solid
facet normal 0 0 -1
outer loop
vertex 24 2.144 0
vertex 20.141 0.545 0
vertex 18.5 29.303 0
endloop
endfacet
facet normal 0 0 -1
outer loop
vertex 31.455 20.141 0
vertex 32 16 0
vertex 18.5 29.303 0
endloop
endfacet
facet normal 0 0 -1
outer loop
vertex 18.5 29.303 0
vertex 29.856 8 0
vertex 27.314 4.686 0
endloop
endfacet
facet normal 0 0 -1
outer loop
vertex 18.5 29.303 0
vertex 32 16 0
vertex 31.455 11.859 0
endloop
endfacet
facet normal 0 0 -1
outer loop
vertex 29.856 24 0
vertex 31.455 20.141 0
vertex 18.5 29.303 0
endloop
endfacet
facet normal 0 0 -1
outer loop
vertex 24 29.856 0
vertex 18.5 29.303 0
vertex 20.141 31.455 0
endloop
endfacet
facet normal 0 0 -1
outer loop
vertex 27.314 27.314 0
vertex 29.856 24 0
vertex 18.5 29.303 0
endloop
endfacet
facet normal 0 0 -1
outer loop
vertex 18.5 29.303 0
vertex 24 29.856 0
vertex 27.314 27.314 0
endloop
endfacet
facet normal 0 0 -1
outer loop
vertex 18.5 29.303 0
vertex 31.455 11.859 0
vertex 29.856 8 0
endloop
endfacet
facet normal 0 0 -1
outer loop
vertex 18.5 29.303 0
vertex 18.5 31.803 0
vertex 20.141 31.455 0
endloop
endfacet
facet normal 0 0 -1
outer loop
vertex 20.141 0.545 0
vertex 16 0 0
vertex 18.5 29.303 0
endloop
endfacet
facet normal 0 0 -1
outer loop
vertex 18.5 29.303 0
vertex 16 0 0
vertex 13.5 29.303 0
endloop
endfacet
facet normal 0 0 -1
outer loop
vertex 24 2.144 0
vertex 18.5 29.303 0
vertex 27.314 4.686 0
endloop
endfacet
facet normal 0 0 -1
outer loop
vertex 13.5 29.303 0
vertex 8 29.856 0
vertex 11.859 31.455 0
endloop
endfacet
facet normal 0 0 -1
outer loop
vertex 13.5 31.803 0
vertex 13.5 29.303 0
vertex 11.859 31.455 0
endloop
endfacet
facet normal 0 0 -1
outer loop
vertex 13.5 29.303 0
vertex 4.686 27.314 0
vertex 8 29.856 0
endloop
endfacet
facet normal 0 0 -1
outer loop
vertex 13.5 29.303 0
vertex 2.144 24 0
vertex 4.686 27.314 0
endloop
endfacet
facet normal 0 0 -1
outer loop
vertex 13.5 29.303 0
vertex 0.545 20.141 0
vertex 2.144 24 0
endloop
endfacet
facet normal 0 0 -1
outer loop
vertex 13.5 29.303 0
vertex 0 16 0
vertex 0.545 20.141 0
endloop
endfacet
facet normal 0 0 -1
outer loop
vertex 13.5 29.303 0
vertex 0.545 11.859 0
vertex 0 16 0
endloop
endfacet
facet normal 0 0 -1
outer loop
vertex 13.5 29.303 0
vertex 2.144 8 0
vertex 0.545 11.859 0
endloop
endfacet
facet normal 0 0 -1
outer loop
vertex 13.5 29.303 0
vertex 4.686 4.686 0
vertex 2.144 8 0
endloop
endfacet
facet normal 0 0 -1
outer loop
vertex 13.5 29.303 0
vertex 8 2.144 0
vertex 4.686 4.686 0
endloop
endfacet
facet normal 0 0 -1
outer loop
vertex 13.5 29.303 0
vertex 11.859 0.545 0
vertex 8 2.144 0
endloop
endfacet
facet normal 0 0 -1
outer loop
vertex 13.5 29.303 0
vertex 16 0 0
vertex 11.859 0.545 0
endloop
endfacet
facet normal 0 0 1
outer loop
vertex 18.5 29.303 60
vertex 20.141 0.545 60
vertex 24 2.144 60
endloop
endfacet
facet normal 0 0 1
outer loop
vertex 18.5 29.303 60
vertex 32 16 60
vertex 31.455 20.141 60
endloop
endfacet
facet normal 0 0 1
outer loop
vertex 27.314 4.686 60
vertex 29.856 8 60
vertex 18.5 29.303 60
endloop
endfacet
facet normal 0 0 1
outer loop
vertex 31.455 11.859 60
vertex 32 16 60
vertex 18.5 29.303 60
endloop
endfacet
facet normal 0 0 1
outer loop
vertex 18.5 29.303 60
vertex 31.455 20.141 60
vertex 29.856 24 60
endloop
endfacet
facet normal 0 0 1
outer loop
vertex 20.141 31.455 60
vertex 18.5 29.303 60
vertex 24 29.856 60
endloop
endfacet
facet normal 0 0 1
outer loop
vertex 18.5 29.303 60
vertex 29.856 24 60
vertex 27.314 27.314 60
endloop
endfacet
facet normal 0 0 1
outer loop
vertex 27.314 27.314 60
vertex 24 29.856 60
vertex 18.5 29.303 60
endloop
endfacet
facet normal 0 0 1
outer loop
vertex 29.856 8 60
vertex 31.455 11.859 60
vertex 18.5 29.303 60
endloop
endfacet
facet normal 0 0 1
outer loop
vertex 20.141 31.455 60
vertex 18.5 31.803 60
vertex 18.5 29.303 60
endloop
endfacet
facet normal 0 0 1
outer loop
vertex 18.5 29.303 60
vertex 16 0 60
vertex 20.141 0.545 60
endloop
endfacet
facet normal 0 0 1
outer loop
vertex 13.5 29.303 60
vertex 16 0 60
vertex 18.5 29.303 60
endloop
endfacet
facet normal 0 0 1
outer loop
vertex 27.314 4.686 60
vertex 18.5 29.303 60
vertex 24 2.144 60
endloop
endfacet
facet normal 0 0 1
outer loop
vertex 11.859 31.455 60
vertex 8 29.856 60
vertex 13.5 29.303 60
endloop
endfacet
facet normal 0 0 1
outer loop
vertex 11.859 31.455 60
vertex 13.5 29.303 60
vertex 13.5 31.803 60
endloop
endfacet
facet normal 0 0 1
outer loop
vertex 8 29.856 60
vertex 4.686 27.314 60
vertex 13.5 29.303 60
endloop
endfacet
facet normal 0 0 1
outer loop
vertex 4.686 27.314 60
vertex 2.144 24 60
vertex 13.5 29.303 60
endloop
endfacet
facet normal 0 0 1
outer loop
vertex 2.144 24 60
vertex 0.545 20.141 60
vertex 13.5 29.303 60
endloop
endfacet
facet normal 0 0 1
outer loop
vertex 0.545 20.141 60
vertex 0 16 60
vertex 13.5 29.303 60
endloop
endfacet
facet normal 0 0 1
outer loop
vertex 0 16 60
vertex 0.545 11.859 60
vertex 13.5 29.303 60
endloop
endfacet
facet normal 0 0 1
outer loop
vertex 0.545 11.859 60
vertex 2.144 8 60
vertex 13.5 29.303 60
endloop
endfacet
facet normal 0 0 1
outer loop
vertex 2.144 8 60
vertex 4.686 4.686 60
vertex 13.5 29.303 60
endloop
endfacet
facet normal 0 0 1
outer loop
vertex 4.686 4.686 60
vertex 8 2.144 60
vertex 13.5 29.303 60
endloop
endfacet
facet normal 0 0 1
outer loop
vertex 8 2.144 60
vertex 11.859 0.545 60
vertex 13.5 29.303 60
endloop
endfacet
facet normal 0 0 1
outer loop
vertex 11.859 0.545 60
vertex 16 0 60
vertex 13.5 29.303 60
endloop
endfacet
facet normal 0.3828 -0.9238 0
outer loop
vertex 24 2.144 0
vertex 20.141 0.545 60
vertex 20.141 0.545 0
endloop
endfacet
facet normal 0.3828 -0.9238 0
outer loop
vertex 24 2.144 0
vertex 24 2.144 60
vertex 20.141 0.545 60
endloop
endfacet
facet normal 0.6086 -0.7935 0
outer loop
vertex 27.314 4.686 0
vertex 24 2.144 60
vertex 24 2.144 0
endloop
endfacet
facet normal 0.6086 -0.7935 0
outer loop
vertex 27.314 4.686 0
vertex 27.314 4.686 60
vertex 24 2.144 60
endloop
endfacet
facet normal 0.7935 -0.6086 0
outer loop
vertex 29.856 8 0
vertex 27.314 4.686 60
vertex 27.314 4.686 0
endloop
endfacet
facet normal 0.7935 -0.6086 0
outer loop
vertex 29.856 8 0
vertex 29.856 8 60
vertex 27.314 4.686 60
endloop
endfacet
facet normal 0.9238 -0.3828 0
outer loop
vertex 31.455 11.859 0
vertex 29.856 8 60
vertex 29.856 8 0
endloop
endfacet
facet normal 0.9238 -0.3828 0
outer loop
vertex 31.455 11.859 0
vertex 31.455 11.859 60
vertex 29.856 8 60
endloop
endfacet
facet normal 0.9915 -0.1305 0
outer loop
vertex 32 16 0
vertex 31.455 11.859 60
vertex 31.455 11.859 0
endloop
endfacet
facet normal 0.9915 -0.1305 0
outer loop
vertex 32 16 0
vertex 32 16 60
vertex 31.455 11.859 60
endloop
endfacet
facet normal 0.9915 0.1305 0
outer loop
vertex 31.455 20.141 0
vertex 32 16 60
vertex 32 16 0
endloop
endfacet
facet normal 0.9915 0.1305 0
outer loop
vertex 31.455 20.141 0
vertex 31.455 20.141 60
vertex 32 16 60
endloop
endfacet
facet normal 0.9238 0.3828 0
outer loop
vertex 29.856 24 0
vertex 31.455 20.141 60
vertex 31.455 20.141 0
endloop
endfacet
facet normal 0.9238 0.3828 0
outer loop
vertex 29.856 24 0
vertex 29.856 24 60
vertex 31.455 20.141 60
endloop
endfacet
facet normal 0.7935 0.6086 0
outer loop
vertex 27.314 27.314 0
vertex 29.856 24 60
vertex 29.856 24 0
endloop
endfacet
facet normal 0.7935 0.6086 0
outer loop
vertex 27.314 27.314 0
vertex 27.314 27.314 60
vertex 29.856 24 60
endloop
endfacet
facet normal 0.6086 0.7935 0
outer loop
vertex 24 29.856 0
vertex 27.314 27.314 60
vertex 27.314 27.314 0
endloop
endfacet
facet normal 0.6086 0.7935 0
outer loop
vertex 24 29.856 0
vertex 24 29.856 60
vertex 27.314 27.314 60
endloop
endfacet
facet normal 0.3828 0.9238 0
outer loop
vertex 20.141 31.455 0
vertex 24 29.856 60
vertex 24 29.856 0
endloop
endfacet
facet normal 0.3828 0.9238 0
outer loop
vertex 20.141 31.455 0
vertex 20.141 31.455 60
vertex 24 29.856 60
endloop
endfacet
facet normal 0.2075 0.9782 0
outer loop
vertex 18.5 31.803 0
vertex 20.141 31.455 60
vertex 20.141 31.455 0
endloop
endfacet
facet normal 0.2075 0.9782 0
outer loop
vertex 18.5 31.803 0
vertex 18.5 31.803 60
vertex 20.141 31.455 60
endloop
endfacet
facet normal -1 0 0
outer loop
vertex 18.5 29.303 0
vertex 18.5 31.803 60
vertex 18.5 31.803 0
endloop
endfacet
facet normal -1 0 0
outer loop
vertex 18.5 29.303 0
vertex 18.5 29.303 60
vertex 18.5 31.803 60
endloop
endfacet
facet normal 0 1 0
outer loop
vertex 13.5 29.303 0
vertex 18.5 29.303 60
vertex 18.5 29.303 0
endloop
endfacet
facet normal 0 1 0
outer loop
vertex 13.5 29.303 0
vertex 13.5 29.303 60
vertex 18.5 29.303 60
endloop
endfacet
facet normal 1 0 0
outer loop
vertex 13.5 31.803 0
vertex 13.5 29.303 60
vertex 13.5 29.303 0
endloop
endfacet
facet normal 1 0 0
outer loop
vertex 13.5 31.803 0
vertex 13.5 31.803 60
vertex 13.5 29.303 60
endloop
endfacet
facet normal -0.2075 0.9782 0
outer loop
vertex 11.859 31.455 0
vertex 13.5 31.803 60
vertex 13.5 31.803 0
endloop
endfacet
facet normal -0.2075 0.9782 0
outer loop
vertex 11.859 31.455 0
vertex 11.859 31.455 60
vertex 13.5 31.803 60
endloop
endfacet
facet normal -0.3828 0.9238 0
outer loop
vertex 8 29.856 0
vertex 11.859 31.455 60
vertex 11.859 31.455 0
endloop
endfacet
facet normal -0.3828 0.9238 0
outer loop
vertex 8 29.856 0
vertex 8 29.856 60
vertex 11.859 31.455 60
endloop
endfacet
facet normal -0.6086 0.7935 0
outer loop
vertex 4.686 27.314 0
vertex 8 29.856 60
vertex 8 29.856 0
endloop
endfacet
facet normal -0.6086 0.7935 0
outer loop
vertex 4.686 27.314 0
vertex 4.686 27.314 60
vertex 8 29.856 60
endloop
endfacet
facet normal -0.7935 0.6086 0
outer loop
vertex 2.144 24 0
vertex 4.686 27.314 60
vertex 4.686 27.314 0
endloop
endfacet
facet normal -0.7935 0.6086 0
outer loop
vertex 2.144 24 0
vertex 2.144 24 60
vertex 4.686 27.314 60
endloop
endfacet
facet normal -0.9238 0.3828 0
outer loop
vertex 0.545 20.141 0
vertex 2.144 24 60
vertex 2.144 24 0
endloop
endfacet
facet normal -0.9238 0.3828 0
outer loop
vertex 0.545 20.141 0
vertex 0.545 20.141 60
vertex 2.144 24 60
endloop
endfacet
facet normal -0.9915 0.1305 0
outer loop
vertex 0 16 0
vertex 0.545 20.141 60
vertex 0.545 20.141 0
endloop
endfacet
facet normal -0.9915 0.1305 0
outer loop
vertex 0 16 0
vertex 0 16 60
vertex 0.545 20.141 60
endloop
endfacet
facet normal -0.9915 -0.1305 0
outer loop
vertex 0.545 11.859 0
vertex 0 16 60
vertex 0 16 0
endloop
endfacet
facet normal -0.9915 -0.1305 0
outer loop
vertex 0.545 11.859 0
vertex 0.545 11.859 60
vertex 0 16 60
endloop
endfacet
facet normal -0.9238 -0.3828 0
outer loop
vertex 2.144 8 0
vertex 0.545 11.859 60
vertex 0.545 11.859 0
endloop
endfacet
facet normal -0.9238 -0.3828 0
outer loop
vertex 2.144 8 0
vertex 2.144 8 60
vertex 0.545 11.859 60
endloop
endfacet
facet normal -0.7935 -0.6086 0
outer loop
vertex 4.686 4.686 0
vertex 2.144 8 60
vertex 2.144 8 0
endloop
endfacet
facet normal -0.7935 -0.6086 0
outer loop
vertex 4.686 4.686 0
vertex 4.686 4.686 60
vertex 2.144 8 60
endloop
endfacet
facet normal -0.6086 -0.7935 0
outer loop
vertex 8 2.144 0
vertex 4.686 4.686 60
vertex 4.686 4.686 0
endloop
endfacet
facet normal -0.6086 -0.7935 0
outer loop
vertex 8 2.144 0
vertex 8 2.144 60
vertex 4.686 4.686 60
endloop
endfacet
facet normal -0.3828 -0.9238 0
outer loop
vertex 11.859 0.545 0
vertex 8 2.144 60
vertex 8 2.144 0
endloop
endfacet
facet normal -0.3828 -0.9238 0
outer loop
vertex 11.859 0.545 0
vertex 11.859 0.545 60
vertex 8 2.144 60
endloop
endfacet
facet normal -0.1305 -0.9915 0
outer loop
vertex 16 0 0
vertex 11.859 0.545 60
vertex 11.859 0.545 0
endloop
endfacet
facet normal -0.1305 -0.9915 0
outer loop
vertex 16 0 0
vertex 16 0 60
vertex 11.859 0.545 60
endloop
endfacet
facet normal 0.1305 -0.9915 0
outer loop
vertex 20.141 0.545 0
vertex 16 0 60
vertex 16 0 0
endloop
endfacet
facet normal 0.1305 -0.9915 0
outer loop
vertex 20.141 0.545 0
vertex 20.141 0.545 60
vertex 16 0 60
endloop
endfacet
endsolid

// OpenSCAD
$fn = 32;

// ----------------------------------------------------------------------
// Keyway shaft: d32 shaft, key 5 x 2.5 mm
// ----------------------------------------------------------------------

// --- parameters (mm) ---
shaft_r = 16;             // shaft radius
key_w = 5;                // keyway width
key_d = 2.5;              // keyway depth below the surface line
plate_t = 60;             // shaft length, Z (extrusion height)

shaft_d = 2 * shaft_r;  // shaft diameter
circle_step = 15;  // polygon sampling step, degrees

profile = [[11.859, 31.455], [8, 29.856], [4.686, 27.314], [2.144, 24], [0.545, 20.141], [0, 16], [0.545, 11.859], [2.144, 8], [4.686, 4.686], [8, 2.144], [11.859, 0.545], [16, 0], [20.141, 0.545], [24, 2.144], [27.314, 4.686], [29.856, 8], [31.455, 11.859], [32, 16], [31.455, 20.141], [29.856, 24], [27.314, 27.314], [24, 29.856], [20.141, 31.455], [18.5, 31.803], [18.5, 29.303], [13.5, 29.303], [13.5, 31.803]];  // primary outline, 27 points, counter clockwise

// --- the one profile operation ---
linear_extrude(height = plate_t) polygon(points = profile);
